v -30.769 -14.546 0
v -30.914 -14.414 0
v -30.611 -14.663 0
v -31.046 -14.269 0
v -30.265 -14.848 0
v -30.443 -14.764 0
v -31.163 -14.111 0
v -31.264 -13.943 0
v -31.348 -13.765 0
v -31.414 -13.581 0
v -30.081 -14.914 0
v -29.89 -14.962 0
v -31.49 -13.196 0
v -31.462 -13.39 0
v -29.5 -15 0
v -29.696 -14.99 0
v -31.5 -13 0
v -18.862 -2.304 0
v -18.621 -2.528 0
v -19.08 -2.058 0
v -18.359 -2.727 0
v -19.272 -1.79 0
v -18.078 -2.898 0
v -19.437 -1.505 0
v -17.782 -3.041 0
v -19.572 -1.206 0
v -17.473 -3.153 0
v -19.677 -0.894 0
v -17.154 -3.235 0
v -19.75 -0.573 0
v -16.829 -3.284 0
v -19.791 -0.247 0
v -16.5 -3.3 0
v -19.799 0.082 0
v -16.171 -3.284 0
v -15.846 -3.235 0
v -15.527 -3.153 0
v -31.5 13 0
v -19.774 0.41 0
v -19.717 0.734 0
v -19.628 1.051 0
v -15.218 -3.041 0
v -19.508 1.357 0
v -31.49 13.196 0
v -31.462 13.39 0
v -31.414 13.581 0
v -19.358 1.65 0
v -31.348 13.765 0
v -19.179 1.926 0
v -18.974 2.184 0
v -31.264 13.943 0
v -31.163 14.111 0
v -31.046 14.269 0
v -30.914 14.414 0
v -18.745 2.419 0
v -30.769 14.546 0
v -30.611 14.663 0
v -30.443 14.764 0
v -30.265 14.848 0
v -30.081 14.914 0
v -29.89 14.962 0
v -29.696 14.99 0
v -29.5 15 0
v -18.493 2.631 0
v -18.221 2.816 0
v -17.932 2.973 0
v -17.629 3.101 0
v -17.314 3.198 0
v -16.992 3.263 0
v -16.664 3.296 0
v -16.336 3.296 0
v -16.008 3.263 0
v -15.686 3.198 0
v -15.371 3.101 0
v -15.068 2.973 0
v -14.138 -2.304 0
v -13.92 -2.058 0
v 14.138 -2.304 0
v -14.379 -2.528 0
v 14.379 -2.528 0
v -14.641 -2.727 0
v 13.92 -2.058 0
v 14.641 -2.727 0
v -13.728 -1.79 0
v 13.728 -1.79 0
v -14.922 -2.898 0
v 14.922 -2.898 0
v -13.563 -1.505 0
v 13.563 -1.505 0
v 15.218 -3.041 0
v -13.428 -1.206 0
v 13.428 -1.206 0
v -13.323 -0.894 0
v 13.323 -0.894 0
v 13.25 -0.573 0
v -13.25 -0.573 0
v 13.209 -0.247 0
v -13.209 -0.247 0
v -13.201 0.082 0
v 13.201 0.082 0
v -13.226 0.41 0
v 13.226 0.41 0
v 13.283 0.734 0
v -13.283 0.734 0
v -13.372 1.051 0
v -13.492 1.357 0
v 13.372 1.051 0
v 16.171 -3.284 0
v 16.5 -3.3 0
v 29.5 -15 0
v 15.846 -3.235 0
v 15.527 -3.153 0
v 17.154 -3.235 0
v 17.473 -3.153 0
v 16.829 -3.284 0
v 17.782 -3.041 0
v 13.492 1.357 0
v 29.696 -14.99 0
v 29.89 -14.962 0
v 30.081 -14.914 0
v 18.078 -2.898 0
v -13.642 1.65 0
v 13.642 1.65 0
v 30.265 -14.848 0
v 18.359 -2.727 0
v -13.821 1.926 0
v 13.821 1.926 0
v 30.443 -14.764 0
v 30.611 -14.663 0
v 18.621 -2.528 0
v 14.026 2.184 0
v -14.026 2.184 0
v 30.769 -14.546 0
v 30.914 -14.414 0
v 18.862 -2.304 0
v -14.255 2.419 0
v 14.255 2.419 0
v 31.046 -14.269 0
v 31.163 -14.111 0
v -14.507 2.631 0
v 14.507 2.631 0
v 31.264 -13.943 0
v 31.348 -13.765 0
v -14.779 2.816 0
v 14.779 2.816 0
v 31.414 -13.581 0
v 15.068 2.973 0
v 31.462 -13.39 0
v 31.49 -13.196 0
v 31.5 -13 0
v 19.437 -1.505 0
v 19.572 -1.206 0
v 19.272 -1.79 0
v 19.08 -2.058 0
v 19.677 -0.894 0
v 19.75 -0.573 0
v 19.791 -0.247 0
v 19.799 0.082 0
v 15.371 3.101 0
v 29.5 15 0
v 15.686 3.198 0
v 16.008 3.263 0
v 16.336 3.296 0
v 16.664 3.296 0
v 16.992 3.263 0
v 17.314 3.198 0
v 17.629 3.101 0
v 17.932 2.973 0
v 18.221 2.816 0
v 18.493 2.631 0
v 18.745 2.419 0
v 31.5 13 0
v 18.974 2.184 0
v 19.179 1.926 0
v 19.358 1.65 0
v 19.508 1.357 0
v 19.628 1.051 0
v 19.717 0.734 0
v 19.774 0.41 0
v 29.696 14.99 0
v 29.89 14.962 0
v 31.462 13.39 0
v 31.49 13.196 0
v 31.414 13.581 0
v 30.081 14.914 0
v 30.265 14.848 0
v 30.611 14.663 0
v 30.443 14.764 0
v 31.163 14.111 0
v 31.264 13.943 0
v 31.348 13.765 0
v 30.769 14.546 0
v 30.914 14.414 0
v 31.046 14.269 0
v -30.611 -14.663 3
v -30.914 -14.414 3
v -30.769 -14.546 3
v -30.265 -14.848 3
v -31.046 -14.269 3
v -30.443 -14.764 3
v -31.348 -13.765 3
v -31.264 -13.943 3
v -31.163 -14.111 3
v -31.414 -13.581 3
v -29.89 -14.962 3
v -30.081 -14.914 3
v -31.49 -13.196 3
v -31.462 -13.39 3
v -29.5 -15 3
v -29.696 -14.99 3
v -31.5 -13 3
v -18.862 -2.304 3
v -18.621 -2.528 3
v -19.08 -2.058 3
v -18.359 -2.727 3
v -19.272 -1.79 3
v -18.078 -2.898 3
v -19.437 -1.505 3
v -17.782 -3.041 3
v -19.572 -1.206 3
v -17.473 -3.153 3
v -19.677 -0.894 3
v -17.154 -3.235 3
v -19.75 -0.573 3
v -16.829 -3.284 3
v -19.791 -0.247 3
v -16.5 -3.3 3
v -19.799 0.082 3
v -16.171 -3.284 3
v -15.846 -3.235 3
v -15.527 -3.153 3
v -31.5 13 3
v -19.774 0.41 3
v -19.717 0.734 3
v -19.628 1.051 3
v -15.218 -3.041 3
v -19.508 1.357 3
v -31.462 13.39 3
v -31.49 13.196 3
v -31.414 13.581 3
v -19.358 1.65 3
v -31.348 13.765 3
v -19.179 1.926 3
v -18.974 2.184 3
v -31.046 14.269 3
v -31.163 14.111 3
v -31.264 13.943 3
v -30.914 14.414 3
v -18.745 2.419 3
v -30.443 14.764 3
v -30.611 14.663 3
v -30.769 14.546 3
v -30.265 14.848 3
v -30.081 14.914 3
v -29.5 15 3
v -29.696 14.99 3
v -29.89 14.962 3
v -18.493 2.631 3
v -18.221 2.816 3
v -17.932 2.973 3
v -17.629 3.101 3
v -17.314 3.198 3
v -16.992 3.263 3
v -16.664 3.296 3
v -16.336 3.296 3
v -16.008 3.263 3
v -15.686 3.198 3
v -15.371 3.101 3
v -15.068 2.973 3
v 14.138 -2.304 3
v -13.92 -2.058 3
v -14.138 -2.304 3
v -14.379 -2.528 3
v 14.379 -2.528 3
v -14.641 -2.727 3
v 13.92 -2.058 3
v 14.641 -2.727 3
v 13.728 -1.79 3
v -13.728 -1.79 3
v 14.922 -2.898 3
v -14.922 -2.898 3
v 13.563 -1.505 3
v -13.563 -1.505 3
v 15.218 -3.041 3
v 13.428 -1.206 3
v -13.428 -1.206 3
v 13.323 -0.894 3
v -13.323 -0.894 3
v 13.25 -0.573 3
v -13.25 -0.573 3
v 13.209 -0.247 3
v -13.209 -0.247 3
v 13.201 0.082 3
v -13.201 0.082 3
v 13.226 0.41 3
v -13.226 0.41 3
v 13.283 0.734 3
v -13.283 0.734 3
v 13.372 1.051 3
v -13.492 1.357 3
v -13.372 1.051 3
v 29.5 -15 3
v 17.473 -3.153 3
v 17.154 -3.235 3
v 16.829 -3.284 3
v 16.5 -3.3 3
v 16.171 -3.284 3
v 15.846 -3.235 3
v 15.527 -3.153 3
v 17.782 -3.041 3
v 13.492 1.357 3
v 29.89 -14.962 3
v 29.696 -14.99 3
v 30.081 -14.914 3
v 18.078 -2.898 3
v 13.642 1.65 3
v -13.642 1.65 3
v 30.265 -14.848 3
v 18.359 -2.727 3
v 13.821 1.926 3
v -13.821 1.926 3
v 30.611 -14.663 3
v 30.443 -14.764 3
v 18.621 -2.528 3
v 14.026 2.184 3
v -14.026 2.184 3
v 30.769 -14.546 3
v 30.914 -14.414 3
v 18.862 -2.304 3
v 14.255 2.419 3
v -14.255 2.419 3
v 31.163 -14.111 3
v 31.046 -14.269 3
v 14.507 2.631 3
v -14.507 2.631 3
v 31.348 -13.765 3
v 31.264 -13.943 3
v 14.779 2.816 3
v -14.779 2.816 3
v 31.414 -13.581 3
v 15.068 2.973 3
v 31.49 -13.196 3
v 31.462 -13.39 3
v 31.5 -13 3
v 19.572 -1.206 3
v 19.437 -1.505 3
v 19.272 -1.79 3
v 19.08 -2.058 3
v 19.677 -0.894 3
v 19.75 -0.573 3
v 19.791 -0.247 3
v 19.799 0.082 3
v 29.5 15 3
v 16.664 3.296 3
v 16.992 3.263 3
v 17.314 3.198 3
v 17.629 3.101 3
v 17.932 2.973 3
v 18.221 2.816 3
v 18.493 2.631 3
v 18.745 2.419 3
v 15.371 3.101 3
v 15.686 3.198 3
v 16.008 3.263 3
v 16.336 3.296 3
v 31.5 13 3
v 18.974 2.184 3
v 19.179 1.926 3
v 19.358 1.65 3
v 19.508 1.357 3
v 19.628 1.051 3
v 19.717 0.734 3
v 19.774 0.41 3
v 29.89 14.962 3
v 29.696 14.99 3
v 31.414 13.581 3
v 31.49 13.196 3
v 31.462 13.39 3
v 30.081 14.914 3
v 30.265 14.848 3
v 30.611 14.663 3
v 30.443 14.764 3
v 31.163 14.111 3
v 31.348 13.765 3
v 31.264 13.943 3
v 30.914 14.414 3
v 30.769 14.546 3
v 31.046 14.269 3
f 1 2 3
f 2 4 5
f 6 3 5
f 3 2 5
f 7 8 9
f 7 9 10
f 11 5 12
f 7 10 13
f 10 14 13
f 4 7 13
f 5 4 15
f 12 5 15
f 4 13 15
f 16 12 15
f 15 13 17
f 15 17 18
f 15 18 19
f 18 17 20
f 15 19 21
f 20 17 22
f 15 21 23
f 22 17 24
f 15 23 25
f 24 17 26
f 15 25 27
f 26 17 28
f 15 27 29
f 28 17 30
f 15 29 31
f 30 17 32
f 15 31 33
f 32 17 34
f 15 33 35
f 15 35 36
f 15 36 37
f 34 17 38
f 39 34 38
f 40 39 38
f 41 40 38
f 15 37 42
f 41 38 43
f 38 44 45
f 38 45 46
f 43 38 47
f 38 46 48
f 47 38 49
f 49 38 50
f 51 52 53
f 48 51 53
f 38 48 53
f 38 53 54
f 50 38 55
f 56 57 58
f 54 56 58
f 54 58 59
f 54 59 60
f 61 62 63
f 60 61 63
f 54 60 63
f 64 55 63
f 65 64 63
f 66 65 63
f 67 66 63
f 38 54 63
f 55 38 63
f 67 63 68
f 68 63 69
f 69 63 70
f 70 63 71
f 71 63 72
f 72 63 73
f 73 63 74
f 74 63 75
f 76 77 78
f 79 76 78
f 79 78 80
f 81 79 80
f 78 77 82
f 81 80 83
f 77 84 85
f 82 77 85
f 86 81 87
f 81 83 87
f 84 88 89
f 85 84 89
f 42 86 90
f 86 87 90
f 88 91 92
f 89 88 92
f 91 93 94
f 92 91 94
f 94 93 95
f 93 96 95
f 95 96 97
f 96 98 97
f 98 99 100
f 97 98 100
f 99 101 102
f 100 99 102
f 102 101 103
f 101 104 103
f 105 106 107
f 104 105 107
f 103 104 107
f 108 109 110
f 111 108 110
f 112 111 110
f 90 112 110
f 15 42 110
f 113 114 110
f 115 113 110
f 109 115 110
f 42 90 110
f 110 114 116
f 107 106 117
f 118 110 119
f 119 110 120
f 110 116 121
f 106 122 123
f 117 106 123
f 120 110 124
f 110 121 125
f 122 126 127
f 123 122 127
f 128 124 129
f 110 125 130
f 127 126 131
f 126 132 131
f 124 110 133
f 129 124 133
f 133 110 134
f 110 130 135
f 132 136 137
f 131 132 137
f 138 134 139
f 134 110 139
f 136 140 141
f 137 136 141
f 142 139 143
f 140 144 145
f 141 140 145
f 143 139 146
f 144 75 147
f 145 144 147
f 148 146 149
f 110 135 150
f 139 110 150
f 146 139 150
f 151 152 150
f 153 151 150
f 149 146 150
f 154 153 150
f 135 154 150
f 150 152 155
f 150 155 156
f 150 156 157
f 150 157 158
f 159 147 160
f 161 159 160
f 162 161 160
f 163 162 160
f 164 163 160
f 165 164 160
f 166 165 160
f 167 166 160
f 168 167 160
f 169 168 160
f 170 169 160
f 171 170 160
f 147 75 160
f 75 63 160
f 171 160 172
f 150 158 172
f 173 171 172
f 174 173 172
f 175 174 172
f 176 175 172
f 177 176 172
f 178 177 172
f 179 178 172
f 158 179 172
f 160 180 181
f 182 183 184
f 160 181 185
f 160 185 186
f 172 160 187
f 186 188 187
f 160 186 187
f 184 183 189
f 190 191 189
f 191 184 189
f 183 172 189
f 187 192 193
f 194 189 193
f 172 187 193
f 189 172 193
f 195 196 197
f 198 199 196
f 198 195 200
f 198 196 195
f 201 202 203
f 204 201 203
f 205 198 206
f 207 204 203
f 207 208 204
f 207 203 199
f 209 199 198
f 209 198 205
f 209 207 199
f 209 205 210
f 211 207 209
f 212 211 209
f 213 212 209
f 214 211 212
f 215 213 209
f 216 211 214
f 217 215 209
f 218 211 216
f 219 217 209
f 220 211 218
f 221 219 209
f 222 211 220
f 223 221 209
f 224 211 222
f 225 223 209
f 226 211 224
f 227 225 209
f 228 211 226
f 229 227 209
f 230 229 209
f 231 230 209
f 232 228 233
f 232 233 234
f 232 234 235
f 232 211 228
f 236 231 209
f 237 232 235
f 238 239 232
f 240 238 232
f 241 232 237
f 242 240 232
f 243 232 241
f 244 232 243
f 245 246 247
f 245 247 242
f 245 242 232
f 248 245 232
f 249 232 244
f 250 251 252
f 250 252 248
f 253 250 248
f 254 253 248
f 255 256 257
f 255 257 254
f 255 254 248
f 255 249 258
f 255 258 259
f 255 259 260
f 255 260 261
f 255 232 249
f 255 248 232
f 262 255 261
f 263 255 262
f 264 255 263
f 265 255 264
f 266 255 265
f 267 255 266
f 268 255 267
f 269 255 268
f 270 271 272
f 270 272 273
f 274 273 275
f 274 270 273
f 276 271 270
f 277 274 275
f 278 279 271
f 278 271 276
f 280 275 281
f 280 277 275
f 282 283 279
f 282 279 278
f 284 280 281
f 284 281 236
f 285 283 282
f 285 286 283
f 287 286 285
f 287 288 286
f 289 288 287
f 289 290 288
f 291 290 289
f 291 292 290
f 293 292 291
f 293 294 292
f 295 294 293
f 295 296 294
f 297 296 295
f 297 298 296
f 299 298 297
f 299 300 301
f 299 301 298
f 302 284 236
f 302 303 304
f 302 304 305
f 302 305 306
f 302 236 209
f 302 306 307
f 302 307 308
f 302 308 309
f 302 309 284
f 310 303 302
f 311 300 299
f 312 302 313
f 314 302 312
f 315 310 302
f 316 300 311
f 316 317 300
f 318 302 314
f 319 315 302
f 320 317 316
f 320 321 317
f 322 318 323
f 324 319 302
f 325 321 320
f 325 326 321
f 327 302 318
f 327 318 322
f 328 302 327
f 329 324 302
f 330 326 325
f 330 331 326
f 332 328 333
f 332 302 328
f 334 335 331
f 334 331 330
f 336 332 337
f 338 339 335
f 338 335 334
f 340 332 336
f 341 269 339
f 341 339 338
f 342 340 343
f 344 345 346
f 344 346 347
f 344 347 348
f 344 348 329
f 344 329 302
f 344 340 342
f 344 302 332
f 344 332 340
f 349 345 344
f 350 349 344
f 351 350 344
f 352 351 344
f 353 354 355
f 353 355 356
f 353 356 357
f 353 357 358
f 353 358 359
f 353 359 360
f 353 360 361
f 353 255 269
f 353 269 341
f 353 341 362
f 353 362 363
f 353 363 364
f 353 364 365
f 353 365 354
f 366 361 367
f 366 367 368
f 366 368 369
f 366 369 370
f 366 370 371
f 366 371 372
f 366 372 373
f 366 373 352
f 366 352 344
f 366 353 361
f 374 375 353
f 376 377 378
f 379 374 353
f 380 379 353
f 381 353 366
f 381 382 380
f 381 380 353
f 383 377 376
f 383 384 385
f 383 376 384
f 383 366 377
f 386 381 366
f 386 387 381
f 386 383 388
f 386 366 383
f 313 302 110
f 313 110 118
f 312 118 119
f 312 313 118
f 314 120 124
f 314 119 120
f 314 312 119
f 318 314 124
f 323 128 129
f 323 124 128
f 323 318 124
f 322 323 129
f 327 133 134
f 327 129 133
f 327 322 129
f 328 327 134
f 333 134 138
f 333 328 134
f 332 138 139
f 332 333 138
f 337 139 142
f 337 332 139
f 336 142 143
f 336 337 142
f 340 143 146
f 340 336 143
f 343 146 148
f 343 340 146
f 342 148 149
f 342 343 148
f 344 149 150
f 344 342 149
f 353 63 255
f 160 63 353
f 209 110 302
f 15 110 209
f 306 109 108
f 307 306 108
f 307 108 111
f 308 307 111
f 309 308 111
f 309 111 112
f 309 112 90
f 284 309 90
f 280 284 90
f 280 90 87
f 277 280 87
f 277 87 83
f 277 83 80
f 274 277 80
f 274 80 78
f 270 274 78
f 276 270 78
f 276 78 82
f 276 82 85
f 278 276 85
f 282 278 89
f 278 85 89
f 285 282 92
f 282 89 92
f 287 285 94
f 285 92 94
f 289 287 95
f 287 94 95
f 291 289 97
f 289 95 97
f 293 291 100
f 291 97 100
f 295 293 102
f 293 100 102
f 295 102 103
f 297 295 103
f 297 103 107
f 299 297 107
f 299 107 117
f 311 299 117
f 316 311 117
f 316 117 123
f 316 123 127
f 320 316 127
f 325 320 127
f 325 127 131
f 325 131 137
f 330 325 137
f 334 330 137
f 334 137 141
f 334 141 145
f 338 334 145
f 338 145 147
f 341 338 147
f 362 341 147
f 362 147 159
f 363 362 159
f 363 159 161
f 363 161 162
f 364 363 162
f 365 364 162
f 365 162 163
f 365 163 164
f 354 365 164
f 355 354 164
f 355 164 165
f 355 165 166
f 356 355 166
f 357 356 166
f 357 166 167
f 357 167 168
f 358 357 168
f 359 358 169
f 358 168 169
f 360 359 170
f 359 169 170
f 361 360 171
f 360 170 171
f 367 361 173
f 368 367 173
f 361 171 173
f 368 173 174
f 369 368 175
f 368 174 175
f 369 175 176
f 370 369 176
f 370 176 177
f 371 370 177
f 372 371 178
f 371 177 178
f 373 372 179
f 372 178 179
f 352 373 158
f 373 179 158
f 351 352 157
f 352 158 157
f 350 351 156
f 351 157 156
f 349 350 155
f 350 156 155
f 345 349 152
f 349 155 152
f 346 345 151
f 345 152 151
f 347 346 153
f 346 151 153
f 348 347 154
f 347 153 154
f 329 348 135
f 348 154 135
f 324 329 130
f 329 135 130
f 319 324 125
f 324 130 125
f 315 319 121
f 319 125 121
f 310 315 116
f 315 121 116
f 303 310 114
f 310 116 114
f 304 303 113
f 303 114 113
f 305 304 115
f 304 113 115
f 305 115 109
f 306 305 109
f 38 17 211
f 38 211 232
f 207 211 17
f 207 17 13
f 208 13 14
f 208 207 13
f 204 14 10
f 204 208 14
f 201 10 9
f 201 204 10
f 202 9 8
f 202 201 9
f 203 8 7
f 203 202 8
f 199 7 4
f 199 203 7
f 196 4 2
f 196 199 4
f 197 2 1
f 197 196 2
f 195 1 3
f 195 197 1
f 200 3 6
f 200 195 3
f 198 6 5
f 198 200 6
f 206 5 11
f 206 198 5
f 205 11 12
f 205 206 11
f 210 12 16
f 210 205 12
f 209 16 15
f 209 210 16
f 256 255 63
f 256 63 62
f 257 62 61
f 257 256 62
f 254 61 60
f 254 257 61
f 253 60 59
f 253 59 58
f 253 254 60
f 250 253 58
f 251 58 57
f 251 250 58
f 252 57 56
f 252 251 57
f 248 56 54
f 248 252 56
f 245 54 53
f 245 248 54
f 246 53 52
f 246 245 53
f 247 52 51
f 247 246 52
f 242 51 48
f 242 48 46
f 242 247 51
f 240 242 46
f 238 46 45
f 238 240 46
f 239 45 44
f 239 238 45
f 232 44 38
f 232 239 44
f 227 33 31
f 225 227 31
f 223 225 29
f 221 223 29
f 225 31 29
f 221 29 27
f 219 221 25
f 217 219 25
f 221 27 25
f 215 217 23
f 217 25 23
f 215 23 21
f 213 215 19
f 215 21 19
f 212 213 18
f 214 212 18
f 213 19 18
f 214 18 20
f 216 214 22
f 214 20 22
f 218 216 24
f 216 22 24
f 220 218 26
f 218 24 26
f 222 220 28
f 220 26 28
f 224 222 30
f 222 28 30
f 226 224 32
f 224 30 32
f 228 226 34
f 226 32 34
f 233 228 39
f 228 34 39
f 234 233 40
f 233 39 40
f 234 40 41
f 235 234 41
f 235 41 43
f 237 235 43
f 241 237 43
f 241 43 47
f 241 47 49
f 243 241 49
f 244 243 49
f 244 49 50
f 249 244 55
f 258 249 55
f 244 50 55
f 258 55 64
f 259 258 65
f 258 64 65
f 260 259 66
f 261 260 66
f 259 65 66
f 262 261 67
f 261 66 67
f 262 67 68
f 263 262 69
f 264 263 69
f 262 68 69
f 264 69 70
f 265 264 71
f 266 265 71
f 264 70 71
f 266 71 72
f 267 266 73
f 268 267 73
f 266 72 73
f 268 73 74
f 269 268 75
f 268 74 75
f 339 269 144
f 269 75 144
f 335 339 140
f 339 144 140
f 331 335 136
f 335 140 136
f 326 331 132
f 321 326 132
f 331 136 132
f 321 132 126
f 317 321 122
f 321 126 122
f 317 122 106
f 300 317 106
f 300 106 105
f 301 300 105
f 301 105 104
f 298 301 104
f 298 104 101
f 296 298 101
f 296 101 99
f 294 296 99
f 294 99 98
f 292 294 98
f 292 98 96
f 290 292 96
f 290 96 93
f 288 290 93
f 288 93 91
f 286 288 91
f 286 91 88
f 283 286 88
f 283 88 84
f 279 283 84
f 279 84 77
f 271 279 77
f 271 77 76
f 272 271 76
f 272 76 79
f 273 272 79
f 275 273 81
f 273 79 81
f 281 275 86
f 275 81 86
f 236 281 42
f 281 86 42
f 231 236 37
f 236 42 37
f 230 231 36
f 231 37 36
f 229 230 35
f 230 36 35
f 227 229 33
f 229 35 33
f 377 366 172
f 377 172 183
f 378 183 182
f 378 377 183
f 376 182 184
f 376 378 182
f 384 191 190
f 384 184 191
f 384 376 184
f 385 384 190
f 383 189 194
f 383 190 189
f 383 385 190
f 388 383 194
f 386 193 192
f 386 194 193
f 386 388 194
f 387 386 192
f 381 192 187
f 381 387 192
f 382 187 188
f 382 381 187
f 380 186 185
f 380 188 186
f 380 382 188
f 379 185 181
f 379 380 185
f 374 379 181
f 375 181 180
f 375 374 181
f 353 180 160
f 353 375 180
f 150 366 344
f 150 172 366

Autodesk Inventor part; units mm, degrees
ref_plane "YZ Plane" through (0, 0, 0) normal (1, 0, 0) x (0, 1, 0)
ref_plane "XZ Plane" through (0, 0, 0) normal (0, 1, 0) x (-1, 0, 0)
ref_plane "XY Plane" through (0, 0, 0) normal (0, 0, 1) x (1, 0, 0)
sketch "スケッチ2" plane through (0, 0, 0) normal (0, 0, 1) x (1, 0, 0)
  line L0 (-31.5, 15) -> (31.5, 15)
  line L1 (31.5, 15) -> (31.5, -15)
  line L2 (31.5, -15) -> (-31.5, -15)
  line L3 (-31.5, -15) -> (-31.5, 15)
  line L4 (0, 21) -> (0, -21) construction
  line L5 (-44.1, 0) -> (44.1, 0) construction
  point P0 (0, 0)
  dimension "d1" = 63
  dimension "d2" = 30
  dimension "d3" = 15
  dimension "d4" = 31.5
extrude "押し出し1" add sketch "スケッチ2" along normal blind 3
sketch "スケッチ3" plane through (0, 0, 3) normal (0, 0, 1) x (1, 0, 0)
  line L0 (-31.5, -15) -> (31.5, -15) construction
  line L1 (31.5, -15) -> (31.5, 15) construction
  line L2 (31.5, 15) -> (-31.5, 15) construction
  line L3 (-31.5, 15) -> (-31.5, -15) construction
  line L4 (-44.1, 0) -> (44.1, 0) construction
  point P0 (0, 0)
  point P1 (-16.5, 0)
  point P2 (16.5, 0)
  dimension "d7" = 15
  dimension "d8" = 15
hole "穴1" at (-16.5, 0, 3) at (16.5, 0, 3) direction (0, 0, -1) diameter 6.6 end through all
fillet "フィレット1" radius 2 4 edges at (-31.5, 15, 1.5) (31.5, 15, 1.5) (31.5, -15, 1.5) (-31.5, -15, 1.5)
equation "\"d3\" = 0.5 * d2"
equation "\"d4\" = 0.5 * d1"
properties part number "rocker_bogie_mount"
